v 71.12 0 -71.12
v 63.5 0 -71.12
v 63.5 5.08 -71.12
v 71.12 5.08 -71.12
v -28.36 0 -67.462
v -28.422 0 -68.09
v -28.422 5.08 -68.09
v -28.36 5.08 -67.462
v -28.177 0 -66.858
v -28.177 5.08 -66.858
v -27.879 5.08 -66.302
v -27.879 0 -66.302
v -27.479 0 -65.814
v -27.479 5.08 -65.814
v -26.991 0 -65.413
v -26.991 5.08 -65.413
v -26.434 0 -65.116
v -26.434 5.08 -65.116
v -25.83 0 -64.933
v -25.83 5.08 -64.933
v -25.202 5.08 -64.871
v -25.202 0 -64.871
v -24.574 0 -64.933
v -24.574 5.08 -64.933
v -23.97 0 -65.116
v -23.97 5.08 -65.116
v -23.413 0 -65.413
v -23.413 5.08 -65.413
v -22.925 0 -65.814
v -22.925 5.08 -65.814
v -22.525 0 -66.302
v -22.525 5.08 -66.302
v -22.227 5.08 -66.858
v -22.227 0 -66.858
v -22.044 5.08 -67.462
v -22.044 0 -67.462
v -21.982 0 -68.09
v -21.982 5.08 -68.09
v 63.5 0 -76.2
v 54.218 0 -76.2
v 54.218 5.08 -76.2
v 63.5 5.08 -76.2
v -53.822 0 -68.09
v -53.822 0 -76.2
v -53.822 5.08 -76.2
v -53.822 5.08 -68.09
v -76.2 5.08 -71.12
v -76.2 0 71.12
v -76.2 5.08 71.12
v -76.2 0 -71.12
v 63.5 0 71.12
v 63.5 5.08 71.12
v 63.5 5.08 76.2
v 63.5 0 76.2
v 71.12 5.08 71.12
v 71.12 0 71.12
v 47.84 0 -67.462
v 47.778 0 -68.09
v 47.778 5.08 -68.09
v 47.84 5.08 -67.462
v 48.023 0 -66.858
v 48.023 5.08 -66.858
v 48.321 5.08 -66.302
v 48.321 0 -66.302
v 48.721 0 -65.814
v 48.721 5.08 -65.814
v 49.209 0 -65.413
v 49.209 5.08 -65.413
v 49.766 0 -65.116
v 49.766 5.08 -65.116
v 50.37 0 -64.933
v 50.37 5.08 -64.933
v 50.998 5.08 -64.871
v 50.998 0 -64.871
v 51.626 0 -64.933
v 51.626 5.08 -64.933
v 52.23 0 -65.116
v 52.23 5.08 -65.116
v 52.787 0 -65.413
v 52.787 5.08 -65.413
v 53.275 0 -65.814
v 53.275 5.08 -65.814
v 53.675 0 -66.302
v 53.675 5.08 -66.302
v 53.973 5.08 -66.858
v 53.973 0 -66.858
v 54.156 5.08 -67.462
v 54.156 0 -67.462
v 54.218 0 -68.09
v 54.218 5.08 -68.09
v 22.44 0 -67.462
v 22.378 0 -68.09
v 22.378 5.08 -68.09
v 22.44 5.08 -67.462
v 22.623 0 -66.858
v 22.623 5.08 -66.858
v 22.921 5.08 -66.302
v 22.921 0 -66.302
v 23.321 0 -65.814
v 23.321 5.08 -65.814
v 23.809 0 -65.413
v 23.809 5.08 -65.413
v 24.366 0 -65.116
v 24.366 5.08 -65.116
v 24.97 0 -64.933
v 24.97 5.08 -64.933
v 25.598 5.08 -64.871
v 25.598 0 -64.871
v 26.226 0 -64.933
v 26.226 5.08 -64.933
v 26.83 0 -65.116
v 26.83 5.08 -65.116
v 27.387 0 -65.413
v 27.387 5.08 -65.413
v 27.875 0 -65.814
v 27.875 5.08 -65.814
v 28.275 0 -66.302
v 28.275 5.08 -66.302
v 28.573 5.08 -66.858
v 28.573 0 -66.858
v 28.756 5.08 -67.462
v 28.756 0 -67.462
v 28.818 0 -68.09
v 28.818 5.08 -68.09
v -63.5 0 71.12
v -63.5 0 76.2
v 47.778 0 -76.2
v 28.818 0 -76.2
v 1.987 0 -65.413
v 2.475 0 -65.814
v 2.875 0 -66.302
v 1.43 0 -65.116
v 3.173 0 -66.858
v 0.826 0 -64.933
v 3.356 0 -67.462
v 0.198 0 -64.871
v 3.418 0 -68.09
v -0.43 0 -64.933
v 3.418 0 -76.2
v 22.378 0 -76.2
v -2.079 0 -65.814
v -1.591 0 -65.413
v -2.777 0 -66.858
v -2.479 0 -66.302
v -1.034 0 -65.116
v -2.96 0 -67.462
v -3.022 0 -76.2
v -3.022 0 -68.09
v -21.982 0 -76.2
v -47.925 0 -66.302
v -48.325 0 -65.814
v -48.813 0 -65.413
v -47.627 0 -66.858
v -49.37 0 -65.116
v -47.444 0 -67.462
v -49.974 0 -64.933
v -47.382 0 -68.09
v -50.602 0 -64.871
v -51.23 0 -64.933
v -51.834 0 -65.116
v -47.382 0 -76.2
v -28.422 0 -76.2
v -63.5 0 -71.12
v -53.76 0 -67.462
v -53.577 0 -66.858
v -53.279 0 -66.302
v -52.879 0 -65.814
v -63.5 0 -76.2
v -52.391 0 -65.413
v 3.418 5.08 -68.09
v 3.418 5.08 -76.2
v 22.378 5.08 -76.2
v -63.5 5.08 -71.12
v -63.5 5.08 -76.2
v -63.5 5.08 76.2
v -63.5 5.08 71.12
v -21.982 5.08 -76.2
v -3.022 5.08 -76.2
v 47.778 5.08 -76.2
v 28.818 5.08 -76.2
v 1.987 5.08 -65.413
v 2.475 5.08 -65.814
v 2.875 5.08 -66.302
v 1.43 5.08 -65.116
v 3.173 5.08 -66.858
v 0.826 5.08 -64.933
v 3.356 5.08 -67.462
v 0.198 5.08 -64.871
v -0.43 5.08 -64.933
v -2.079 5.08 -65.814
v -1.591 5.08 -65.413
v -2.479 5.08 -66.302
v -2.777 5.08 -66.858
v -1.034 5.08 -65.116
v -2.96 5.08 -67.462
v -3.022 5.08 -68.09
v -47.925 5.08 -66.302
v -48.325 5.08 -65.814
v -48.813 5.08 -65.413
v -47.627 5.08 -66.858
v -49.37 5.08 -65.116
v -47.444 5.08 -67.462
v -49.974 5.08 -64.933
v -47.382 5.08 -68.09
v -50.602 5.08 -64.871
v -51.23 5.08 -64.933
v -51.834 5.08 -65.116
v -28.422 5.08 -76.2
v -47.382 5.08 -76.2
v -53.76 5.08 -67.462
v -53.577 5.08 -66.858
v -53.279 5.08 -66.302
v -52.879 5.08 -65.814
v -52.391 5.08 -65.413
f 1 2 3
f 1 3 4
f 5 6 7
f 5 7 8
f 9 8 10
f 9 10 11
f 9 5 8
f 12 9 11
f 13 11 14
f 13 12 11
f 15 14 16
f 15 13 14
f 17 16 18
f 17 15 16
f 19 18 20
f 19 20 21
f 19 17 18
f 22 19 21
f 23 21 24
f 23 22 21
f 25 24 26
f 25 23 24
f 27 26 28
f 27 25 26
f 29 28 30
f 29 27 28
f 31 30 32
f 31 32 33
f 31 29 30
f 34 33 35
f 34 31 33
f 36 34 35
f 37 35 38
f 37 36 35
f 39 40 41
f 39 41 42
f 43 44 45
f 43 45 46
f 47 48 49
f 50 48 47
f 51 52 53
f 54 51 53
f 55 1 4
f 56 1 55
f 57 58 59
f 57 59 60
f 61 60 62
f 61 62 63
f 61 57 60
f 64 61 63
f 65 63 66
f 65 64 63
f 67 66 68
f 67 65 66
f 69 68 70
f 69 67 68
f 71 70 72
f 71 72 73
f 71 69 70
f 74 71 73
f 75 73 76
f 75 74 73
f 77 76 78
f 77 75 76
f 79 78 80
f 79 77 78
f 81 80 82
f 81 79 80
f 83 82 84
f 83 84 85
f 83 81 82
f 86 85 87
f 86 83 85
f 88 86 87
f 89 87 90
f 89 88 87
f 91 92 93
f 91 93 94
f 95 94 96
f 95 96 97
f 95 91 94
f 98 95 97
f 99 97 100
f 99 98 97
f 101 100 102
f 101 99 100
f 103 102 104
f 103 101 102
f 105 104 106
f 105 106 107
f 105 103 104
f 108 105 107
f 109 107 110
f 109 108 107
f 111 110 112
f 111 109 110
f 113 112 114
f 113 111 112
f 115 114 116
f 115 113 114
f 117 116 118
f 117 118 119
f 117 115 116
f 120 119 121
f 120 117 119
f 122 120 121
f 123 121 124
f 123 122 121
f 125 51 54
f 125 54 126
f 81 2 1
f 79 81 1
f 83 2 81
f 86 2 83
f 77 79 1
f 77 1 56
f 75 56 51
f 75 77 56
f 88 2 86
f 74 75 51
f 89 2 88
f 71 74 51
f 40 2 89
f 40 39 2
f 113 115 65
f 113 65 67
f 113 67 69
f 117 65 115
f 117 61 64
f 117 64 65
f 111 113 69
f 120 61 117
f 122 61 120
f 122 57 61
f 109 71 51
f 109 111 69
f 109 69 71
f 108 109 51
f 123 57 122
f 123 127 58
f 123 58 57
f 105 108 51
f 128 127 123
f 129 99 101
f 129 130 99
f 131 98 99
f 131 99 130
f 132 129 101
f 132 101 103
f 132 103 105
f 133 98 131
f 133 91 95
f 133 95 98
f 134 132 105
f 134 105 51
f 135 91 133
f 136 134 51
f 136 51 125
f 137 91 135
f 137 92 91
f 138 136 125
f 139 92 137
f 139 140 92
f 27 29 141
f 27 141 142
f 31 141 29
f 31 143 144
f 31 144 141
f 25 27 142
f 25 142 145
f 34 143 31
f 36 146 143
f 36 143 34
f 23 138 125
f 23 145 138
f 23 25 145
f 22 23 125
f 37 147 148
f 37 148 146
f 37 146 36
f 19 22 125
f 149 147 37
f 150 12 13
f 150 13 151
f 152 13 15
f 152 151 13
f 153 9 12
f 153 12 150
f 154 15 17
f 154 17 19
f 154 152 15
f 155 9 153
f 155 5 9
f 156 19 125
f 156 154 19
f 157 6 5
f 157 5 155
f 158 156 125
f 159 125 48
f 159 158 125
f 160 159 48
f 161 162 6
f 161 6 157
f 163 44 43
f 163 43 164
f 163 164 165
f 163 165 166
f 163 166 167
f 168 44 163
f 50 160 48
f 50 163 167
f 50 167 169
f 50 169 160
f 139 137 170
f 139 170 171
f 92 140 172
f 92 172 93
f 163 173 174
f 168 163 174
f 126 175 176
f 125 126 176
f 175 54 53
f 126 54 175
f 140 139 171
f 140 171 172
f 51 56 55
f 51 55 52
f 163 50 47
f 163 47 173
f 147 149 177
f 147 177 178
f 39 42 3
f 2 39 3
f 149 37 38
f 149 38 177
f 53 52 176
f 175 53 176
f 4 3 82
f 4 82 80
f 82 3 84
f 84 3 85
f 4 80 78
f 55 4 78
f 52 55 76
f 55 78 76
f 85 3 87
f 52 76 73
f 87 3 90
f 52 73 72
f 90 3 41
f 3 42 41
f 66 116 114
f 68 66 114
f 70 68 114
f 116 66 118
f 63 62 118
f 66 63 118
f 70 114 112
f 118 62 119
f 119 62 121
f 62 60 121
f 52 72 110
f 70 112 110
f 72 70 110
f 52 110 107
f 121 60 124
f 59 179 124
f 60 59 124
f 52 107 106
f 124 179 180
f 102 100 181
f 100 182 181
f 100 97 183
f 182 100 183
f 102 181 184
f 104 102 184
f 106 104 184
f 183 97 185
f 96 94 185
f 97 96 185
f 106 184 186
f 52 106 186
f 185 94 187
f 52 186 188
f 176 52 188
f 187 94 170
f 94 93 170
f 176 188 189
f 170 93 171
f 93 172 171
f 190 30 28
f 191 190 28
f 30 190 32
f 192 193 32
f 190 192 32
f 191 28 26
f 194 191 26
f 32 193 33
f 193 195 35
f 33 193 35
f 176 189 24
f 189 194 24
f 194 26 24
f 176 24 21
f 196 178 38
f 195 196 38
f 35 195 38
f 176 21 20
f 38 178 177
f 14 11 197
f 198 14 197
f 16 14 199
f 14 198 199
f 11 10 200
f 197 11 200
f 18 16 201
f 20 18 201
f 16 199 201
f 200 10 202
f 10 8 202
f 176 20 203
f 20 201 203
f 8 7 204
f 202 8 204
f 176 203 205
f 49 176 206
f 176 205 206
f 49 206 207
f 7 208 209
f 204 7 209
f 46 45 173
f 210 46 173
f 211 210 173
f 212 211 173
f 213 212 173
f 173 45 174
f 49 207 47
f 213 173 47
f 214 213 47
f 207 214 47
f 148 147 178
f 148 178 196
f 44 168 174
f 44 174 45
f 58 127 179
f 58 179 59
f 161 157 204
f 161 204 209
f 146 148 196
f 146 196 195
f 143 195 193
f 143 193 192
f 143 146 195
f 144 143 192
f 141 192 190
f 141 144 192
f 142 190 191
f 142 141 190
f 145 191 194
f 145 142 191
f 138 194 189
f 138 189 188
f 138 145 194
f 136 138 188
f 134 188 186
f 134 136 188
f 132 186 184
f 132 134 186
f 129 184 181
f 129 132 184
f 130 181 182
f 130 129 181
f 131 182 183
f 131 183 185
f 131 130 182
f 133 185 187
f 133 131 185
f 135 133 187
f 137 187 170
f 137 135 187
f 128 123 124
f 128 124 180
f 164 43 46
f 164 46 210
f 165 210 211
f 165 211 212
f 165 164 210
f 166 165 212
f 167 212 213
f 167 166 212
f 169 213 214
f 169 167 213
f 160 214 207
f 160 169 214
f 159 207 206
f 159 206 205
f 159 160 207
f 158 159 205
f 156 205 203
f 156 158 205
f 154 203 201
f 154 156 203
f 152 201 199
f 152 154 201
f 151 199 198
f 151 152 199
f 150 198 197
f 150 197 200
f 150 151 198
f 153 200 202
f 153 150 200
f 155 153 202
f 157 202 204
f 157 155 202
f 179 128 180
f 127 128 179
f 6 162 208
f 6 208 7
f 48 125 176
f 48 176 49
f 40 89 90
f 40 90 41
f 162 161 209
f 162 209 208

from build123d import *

# Parameters (mm, degrees)
BOSS_EXTRUDE1_DEPTH = 5.08


with BuildPart() as part:
    # Sketch1 → Boss-Extrude1 (new body)
    with BuildSketch(Plane(origin=(0, 0, 0), x_dir=(1, 0, 0), z_dir=(0, 1, 0))):
        with BuildLine():
            Line((-71.12, 71.12), (-63.5, 71.12))
            Line((-63.5, 71.12), (-63.5, 76.2))
            Line((-63.5, 76.2), (-53.821964394, 76.2))
            Line((-53.821964394, 76.2), (-53.821964394, 68.090455215))
            ThreePointArc((-53.821964394, 68.090455215), (-50.602147322, 64.870638143), (-47.38233025, 68.090455215))
            Line((-47.38233025, 68.090455215), (-47.38233025, 76.2))
            Line((-47.38233025, 76.2), (-28.421964394, 76.2))
            Line((-28.421964394, 76.2), (-28.421964394, 68.090455215))
            ThreePointArc((-28.421964394, 68.090455215), (-25.202147322, 64.870638143), (-21.98233025, 68.090455215))
            Line((-21.98233025, 68.090455215), (-21.98233025, 76.2))
            Line((-21.98233025, 76.2), (-3.021964394, 76.2))
            Line((-3.021964394, 76.2), (-3.021964394, 68.090455215))
            ThreePointArc((-3.021964394, 68.090455215), (0.197852678, 64.870638143), (3.41766975, 68.090455215))
            Line((3.41766975, 68.090455215), (3.41766975, 76.2))
            Line((3.41766975, 76.2), (22.378035606, 76.2))
            Line((22.378035606, 76.2), (22.378035606, 68.090455215))
            ThreePointArc((22.378035606, 68.090455215), (25.597852678, 64.870638143), (28.81766975, 68.090455215))
            Line((28.81766975, 68.090455215), (28.81766975, 76.2))
            Line((28.81766975, 76.2), (47.778035606, 76.2))
            Line((47.778035606, 76.2), (47.778035606, 68.090455215))
            ThreePointArc((47.778035606, 68.090455215), (50.997852678, 64.870638143), (54.21766975, 68.090455215))
            Line((54.21766975, 68.090455215), (54.21766975, 76.2))
            Line((54.21766975, 76.2), (63.5, 76.2))
            Line((63.5, 76.2), (63.5, 71.12))
            Line((63.5, 71.12), (71.12, 71.12))
            Line((71.12, 71.12), (71.12, 63.5))
            Line((71.12, 63.5), (71.12, -63.5))
            Line((71.12, -63.5), (71.12, -71.12))
            Line((71.12, -71.12), (63.5, -71.12))
            Line((63.5, -71.12), (63.5, -76.2))
            Line((63.5, -76.2), (-63.5, -76.2))
            Line((-63.5, -76.2), (-63.5, -71.12))
            Line((-63.5, -71.12), (-71.12, -71.12))
            Line((-71.12, -71.12), (-76.2, -71.12))
            Line((-76.2, -71.12), (-76.2, -63.5))
            Line((-76.2, -63.5), (-76.2, 63.5))
            Line((-76.2, 63.5), (-76.2, 71.12))
            Line((-76.2, 71.12), (-71.12, 71.12))
        make_face()
    extrude(amount=BOSS_EXTRUDE1_DEPTH)


solid = part.part
